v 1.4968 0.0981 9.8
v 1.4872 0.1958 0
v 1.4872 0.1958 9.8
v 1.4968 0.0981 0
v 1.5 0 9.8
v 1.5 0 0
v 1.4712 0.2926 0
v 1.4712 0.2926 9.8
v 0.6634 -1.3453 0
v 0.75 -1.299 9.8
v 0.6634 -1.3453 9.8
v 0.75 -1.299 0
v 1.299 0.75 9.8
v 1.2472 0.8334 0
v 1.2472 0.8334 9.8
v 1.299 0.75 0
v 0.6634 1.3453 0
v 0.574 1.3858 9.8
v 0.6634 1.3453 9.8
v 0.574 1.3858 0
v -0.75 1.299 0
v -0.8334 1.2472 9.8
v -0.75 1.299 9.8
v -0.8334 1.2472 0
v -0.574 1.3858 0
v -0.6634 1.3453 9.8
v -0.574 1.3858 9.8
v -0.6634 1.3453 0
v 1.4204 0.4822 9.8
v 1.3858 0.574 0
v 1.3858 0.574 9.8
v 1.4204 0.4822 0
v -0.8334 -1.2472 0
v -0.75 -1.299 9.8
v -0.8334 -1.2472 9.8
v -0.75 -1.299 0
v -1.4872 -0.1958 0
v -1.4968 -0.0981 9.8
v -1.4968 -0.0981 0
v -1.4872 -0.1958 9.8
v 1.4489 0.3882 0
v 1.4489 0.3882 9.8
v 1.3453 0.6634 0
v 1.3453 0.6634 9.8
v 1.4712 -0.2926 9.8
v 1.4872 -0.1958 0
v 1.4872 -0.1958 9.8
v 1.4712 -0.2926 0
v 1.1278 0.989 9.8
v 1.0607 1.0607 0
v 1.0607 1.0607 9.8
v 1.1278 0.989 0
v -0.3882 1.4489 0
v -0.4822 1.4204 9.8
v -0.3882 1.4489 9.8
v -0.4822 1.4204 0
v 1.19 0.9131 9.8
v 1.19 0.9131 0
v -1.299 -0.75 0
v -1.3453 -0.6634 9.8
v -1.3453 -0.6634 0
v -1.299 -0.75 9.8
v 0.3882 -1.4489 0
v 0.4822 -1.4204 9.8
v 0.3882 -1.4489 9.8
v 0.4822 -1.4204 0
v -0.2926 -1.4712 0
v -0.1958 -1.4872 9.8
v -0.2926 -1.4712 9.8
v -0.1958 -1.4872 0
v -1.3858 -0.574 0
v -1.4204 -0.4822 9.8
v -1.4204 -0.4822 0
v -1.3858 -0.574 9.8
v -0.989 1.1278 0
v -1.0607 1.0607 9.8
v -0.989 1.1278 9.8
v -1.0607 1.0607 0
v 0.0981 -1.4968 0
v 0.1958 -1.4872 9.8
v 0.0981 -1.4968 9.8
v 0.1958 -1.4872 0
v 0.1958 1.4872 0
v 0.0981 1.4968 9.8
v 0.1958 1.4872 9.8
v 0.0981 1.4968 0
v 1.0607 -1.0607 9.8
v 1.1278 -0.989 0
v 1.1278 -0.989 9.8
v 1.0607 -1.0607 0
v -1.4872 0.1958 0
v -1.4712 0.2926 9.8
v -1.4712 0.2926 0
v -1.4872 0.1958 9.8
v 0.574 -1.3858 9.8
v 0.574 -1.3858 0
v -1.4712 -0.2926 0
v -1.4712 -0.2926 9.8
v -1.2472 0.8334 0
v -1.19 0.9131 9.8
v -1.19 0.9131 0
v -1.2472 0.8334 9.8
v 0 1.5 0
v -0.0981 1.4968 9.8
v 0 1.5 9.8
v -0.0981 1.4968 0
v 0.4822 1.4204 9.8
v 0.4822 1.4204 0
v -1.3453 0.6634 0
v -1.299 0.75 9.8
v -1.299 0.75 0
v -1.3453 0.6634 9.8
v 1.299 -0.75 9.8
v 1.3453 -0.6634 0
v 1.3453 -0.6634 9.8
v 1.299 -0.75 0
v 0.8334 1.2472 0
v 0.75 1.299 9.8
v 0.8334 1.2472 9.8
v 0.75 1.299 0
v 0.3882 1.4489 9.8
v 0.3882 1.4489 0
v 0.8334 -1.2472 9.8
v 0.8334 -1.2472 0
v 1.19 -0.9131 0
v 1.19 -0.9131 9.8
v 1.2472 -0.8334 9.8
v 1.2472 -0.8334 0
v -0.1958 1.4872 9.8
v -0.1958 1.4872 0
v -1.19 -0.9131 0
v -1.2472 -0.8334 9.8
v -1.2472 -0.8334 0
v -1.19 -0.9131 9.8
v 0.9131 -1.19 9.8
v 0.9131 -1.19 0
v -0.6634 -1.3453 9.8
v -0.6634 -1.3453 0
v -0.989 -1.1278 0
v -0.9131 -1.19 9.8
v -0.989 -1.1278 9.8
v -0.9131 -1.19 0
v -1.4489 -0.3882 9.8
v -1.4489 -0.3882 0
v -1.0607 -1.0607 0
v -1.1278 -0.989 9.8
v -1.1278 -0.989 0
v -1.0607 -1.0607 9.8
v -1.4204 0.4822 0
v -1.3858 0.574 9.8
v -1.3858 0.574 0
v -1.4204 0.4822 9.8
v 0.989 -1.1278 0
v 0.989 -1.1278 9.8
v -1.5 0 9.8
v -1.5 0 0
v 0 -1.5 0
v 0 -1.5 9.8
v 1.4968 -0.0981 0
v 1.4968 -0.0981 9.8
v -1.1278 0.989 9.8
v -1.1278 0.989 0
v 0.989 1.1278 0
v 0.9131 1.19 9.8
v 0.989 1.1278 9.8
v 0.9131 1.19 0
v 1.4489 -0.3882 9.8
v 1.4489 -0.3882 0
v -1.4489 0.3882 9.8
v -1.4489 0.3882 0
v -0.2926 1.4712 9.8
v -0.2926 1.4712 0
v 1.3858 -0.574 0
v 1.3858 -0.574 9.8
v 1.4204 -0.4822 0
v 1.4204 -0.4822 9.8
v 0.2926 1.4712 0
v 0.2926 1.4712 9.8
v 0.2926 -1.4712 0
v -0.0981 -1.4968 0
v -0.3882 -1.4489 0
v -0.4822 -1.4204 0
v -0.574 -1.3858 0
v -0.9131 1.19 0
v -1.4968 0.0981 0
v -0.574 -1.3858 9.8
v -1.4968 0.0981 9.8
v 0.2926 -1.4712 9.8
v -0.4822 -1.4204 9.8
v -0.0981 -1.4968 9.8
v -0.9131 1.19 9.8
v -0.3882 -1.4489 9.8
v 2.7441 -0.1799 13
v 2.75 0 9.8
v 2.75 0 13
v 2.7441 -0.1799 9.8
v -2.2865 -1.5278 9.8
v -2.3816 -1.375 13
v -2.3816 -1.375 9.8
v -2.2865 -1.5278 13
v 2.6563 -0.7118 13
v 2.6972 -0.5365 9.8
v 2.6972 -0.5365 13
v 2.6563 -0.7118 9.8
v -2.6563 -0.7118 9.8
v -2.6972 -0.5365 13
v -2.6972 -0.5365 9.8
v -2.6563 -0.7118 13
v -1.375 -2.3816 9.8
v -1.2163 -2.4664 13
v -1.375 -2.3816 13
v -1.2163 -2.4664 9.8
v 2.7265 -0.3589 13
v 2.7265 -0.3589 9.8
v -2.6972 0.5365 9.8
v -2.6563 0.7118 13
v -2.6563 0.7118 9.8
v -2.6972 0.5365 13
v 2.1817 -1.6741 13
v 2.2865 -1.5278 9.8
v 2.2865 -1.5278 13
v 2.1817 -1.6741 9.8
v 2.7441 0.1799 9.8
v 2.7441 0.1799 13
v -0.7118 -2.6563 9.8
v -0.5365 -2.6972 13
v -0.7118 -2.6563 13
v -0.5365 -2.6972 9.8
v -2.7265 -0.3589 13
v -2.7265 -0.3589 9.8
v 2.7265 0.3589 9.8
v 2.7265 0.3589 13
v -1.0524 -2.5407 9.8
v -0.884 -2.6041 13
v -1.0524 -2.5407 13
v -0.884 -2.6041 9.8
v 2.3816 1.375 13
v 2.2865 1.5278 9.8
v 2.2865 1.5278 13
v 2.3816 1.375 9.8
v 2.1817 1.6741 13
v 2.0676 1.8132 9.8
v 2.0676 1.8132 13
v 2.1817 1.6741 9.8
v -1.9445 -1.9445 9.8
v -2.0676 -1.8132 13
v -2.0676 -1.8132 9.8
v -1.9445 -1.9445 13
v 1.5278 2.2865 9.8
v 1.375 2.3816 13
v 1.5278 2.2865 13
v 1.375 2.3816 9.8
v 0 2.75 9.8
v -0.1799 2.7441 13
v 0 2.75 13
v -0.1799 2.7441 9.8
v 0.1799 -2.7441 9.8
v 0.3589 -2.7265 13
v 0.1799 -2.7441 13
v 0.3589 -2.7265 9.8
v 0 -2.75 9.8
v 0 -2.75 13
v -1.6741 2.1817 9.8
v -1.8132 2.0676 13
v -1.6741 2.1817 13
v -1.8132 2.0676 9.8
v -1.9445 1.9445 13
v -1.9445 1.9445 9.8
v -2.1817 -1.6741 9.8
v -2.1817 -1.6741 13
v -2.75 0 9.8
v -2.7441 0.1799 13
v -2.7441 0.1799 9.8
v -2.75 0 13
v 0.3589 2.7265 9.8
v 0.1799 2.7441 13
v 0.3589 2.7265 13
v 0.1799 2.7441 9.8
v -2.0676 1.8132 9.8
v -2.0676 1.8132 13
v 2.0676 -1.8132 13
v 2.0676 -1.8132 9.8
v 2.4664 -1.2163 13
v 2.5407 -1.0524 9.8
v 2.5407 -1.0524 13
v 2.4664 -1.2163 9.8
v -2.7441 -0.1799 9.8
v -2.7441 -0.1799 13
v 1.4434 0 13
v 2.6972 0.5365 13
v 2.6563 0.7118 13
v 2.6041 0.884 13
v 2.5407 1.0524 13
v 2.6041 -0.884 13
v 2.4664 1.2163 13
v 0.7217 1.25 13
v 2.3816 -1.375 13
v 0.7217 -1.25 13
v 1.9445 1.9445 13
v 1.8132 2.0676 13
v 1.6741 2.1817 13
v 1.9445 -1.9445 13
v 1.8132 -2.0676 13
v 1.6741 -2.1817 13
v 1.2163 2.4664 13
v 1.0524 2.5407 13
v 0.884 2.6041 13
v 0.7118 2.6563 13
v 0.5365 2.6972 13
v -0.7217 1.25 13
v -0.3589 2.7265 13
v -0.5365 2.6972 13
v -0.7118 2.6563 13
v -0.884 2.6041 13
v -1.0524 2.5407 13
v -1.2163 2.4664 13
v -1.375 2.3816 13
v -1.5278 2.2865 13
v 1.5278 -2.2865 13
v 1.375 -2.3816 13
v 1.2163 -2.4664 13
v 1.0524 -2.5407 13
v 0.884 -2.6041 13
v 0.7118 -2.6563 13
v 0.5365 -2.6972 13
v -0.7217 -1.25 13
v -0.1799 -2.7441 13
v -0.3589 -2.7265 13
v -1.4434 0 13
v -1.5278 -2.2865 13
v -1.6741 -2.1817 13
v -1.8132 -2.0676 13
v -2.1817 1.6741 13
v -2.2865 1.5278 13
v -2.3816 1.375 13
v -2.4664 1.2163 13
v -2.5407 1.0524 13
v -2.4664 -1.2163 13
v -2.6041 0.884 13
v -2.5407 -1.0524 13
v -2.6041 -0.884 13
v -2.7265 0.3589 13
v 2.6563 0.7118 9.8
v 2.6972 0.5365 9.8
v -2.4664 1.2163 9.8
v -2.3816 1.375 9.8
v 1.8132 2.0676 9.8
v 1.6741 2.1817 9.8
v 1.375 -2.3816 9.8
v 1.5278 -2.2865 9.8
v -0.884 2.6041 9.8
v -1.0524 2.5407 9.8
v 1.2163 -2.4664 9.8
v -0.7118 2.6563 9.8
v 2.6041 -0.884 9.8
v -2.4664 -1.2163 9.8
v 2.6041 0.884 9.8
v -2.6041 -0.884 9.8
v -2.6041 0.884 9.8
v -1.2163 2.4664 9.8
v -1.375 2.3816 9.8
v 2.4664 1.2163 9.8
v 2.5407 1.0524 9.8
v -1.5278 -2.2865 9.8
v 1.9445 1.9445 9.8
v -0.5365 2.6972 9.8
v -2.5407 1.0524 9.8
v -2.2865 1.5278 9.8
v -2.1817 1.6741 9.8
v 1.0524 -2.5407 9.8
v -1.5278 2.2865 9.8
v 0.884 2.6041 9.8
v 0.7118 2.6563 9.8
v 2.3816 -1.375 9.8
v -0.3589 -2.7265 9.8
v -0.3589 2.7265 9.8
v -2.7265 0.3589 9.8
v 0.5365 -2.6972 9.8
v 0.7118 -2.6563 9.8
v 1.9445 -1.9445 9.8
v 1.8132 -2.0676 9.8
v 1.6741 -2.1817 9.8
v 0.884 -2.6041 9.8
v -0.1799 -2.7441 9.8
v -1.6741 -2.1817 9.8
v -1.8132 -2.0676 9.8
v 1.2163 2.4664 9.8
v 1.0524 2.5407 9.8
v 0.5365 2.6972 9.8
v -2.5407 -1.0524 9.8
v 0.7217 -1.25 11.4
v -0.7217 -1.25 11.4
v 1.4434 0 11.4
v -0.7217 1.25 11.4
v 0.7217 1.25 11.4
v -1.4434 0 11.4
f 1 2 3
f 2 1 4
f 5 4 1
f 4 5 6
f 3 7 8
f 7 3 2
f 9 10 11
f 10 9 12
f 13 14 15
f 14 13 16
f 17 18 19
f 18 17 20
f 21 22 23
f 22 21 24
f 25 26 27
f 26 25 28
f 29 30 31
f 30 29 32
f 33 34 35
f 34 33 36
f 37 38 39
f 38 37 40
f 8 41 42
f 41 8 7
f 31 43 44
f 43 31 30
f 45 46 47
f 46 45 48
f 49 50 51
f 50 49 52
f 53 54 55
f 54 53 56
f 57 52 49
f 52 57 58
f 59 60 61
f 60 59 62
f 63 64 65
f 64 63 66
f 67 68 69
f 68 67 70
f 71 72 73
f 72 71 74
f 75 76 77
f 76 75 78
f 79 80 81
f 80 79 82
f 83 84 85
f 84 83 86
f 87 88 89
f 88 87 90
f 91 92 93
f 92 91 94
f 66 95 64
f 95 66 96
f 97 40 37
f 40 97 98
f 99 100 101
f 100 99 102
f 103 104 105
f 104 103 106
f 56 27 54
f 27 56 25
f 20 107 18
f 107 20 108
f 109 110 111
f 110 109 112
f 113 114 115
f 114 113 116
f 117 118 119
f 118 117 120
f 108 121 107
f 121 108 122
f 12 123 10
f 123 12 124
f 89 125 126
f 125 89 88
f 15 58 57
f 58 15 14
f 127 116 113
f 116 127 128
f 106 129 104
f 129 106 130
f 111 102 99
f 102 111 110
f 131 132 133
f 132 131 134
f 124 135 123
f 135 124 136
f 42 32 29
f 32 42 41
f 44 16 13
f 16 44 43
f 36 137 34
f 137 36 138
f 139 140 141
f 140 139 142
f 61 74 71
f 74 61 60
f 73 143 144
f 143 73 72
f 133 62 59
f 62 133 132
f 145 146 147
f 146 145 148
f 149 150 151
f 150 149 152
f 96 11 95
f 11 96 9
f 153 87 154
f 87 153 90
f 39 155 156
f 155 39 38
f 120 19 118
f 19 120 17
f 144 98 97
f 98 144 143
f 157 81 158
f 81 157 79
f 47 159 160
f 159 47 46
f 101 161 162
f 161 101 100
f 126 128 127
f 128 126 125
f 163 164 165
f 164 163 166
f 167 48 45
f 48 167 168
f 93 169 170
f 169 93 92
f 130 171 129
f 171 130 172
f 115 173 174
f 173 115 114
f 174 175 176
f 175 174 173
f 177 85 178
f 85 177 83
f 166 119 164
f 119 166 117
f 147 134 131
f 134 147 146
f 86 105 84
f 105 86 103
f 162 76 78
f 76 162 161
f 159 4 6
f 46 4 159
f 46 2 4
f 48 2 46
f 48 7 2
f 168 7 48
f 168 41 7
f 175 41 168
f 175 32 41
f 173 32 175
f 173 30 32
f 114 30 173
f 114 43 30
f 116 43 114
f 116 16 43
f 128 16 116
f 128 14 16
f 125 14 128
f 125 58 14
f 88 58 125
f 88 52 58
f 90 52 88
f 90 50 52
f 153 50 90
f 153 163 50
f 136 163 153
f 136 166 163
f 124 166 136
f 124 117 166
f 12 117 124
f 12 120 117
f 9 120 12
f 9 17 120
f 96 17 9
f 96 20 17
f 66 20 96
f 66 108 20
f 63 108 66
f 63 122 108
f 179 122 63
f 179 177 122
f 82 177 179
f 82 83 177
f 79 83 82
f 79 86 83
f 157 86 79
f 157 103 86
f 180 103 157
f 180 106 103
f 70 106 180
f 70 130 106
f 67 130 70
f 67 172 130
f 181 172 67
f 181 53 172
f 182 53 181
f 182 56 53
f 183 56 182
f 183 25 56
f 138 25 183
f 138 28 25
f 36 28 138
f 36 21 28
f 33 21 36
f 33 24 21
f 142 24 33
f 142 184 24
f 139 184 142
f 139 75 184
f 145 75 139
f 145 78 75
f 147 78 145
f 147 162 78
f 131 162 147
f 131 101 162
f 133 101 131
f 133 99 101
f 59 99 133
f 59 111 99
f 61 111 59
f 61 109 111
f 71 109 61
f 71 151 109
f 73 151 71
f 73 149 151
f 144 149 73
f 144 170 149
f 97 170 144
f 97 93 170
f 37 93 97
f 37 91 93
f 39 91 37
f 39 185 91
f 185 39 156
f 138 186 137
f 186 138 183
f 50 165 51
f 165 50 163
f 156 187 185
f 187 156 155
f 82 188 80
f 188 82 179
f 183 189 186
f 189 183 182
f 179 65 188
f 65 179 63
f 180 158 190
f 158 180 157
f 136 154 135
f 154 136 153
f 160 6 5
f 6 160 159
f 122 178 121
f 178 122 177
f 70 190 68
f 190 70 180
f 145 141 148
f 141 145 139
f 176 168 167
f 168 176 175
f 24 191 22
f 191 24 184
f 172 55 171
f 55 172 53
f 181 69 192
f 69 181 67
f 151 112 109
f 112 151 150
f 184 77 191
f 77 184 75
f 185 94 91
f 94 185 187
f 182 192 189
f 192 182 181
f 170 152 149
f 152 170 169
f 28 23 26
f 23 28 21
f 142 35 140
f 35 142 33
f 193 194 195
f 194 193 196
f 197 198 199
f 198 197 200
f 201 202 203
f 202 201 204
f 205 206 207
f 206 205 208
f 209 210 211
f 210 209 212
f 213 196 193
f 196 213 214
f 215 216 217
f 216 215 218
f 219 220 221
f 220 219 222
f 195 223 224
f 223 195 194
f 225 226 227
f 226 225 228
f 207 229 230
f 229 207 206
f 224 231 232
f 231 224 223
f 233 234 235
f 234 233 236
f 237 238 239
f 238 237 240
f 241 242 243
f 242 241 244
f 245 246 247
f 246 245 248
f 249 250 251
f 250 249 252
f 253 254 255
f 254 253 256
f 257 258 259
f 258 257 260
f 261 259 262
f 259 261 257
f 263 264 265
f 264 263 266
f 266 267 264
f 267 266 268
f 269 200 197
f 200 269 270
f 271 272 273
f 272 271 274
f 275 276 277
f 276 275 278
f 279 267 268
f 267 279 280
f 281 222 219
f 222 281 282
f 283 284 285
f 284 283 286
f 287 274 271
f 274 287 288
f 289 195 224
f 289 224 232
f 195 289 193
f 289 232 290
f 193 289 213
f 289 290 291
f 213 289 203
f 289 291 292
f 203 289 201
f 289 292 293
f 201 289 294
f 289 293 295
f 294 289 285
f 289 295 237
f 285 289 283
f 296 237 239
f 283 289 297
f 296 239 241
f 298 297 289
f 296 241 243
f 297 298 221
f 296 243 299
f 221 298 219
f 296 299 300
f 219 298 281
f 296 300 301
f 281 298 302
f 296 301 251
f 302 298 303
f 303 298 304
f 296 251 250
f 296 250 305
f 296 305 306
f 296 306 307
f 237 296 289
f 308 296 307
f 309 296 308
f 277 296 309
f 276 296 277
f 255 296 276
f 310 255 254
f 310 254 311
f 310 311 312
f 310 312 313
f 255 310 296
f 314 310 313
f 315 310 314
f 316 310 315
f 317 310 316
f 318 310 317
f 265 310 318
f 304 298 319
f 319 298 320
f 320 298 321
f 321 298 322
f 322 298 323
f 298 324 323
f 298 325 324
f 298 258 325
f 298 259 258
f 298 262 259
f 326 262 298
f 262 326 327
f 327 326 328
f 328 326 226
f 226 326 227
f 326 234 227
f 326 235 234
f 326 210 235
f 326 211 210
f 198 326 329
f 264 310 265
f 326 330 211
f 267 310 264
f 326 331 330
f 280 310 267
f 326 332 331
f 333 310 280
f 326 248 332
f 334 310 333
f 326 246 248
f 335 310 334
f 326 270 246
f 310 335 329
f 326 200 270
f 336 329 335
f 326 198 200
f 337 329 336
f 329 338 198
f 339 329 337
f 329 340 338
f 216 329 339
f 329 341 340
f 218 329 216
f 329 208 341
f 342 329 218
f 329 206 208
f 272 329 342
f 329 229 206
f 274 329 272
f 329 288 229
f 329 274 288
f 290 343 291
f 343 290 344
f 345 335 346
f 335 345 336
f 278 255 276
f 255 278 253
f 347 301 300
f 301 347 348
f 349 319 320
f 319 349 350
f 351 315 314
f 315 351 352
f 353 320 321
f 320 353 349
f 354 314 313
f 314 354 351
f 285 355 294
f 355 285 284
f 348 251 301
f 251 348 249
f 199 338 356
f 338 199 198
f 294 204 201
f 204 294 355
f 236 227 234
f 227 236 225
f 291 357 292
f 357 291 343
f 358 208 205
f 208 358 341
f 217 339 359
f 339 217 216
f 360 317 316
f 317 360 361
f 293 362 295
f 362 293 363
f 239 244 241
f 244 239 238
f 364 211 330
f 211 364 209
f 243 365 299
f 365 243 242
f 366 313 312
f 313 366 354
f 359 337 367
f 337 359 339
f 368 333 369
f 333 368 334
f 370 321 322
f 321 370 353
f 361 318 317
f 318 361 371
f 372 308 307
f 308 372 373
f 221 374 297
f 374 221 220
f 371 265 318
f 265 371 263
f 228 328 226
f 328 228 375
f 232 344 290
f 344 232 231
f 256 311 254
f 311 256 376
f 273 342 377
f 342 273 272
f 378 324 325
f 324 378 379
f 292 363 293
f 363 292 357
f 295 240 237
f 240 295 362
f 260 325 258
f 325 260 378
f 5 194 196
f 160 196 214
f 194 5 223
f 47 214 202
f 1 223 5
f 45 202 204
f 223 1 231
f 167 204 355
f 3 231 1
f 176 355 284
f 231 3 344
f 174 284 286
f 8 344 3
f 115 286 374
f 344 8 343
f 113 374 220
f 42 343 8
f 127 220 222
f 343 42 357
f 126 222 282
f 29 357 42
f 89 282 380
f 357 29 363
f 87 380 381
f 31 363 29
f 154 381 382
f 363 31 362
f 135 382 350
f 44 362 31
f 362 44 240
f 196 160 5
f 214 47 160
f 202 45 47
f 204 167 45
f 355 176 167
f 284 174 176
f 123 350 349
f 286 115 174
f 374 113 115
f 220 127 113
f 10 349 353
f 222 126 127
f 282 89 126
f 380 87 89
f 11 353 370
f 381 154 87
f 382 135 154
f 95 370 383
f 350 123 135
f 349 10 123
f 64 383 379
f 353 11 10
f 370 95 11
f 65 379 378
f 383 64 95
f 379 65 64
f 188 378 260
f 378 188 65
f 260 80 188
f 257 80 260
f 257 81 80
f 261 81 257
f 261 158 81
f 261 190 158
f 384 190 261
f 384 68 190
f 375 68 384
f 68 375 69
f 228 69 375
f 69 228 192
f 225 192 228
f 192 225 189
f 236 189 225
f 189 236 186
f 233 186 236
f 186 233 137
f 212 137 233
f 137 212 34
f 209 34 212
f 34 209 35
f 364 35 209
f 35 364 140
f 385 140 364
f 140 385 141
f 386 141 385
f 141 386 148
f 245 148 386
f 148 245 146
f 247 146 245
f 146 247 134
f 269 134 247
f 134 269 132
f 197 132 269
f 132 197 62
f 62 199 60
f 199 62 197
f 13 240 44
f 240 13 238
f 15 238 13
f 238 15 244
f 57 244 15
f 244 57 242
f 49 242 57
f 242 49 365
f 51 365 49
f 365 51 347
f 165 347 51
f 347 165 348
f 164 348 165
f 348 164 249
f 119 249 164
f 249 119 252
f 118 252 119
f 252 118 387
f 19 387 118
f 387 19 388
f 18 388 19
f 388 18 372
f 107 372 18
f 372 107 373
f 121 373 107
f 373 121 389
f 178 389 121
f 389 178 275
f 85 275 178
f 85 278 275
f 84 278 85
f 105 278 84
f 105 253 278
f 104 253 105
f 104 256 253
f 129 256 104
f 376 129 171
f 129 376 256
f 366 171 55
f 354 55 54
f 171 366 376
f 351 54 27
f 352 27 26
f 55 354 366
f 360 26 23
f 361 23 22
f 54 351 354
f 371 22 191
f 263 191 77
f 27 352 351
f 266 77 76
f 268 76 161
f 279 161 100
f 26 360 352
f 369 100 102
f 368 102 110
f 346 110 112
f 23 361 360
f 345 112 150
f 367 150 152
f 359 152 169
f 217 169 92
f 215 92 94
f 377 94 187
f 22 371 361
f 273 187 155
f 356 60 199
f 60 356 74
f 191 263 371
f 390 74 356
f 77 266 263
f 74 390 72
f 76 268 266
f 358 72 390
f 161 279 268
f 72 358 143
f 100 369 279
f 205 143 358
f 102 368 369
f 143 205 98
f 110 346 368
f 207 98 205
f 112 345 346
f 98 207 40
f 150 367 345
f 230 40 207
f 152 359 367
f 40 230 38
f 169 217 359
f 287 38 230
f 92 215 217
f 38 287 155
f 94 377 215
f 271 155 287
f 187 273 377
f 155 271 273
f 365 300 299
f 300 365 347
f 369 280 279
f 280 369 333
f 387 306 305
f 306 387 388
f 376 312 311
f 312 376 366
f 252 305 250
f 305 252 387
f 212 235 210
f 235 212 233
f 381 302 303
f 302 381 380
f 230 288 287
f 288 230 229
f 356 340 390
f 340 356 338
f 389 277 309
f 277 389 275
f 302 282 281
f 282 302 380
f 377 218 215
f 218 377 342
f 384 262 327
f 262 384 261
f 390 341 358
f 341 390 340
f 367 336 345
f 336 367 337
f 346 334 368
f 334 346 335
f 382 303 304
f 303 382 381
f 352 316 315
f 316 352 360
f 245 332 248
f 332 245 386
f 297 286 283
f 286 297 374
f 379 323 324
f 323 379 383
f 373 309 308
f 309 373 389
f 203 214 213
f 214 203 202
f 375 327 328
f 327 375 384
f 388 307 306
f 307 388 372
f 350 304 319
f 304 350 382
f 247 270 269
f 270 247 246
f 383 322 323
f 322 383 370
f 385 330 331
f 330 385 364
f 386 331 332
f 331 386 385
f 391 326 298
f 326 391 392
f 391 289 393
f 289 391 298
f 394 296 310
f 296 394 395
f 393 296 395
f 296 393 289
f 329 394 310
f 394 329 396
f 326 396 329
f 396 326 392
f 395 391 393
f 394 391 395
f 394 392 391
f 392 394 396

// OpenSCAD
$fn = 96;

// Target dimensions (mm)
thread_diameter_mm = 3.0;
length_mm          = 10.0;   // under-head length
head_diameter_mm   = 5.5;
head_height_mm     = 3.0;

// Socket (approx for M3)
socket_af_mm       = 2.5;    // across flats
socket_depth_mm    = 1.6;

// Small overlaps to ensure watertight unions/differences
eps = 0.02;
overlap_mm = 0.2;

// Derived
shank_r = thread_diameter_mm/2;
head_r  = head_diameter_mm/2;

// Hex socket radius (circumradius) from across-flats
hex_R = (socket_af_mm/2)/cos(30);

// One connected solid: socket head cap screw
module socket_head_cap_screw() {
    difference() {
        union() {
            // Shank (under head): z from 0 to length_mm
            cylinder(r=shank_r, h=length_mm, center=false);

            // Head: sits on top of shank, z from length_mm to length_mm+head_height_mm
            translate([0, 0, length_mm - overlap_mm])
                cylinder(r=head_r, h=head_height_mm + overlap_mm, center=false);

            // Tip chamfer (simple cone) at end of shank, connected
            tip_chamfer_h = min(0.8, length_mm/2);
            translate([0, 0, length_mm - tip_chamfer_h])
                cylinder(r1=shank_r, r2=0, h=tip_chamfer_h, center=false);
        }

        // Hex socket recess in head (cut from top)
        translate([0, 0, length_mm + head_height_mm - socket_depth_mm])
            cylinder(r=hex_R, h=socket_depth_mm + eps, center=false, $fn=6);
    }
}

socket_head_cap_screw();
